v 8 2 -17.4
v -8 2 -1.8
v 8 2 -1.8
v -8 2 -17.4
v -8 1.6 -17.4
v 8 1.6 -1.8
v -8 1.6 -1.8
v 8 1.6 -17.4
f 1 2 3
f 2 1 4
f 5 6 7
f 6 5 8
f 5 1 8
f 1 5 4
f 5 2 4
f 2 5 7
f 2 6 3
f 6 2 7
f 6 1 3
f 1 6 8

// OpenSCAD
// file: ../p/box.scad
use <../lib.scad>
function ldraw_lib__box() = [
// 0 Box 6 (six faces)
// 0 Name: box.dat
// 0 Author: James Jessiman
// 0 !LDRAW_ORG Primitive UPDATE 2002-05
// 0 !LICENSE Licensed under CC BY 4.0 : see CAreadme.txt
// 
// 0 BFC CERTIFY CCW
  [0,"BFC","CERTIFY"],
  [0,"BFC","CCW"],
// 
// 0 !HISTORY 2002-08-22 [sbliss] Applied BFC
// 0 !HISTORY 2002-11-30 [PTadmin] Official Update 2002-05
// 0 !HISTORY 2007-06-24 [PTadmin] Header formatted for Contributor Agreement
// 0 !HISTORY 2008-07-01 [PTadmin] Official Update 2008-01
// 
// 
// 2 24 1 1 1 -1 1 1
  [2,24,1,1,1,-1,1,1],
// 2 24 -1 1 1 -1 1 -1
  [2,24,-1,1,1,-1,1,-1],
// 2 24 -1 1 -1 1 1 -1
  [2,24,-1,1,-1,1,1,-1],
// 2 24 1 1 -1 1 1 1
  [2,24,1,1,-1,1,1,1],
// 2 24 1 -1 1 -1 -1 1
  [2,24,1,-1,1,-1,-1,1],
// 2 24 -1 -1 1 -1 -1 -1
  [2,24,-1,-1,1,-1,-1,-1],
// 2 24 -1 -1 -1 1 -1 -1
  [2,24,-1,-1,-1,1,-1,-1],
// 2 24 1 -1 -1 1 -1 1
  [2,24,1,-1,-1,1,-1,1],
// 2 24 1 -1 1 1 1 1
  [2,24,1,-1,1,1,1,1],
// 2 24 -1 -1 1 -1 1 1
  [2,24,-1,-1,1,-1,1,1],
// 2 24 1 -1 -1 1 1 -1
  [2,24,1,-1,-1,1,1,-1],
// 2 24 -1 -1 -1 -1 1 -1
  [2,24,-1,-1,-1,-1,1,-1],
// 4 16 1 1 1 1 1 -1 -1 1 -1 -1 1 1
  [4,16,1,1,1,1,1,-1,-1,1,-1,-1,1,1],
// 4 16 -1 -1 -1 1 -1 -1 1 -1 1 -1 -1 1
  [4,16,-1,-1,-1,1,-1,-1,1,-1,1,-1,-1,1],
// 4 16 -1 -1 1 1 -1 1 1 1 1 -1 1 1
  [4,16,-1,-1,1,1,-1,1,1,1,1,-1,1,1],
// 4 16 -1 -1 -1 -1 -1 1 -1 1 1 -1 1 -1
  [4,16,-1,-1,-1,-1,-1,1,-1,1,1,-1,1,-1],
// 4 16 1 -1 -1 -1 -1 -1 -1 1 -1 1 1 -1
  [4,16,1,-1,-1,-1,-1,-1,-1,1,-1,1,1,-1],
// 4 16 1 -1 1 1 -1 -1 1 1 -1 1 1 1
  [4,16,1,-1,1,1,-1,-1,1,1,-1,1,1,1],
// 0
];
module ldraw_lib__box(step=0, col=false, unit=2/5, alt=false, line=0.2, solid=!$preview)
    makepoly(ldraw_lib__box(), step=step, col=col, unit=unit, alt=alt, line=line, solid=solid);
ldraw_lib__box(line=0.2);
// main file
use <../lib.scad>
use <../p/box.scad>
function ldraw_lib__u8032() = [
// 0 ~Mursten Glass for Window Pane  1 x  2 x  2
// 0 Name: u8032.dat
// 0 Author: J.C. Tchang [tchang]
// 0 !LDRAW_ORG Part UPDATE 2025-09
// 0 !LICENSE Licensed under CC BY 4.0 : see CAreadme.txt
// 
// 0 BFC CERTIFY CCW
  [0,"BFC","CERTIFY"],
  [0,"BFC","CCW"],
// 
// 0 !CATEGORY Window
// 0 !KEYWORDS Automatic Binding Brick
// 
// 0 !CMDLINE -c47
// 
// 0 !HISTORY 2019-09-09 [PTadmin] Official Update 2019-02
// 0 !HISTORY 2025-09-27 [OrionP] Changed winding to CCW
// 0 !HISTORY 2025-09-29 [OrionP] Official Update 2025-09
// 
// 1 16 0 24 4.5 20 0 0 0 0 19.5 0 0.5 0 box.dat
  [1,16,0,24,4.5,20,0,0,0,0,19.5,0,0.5,0, ldraw_lib__box()],
];
module ldraw_lib__u8032(step=0, col=false, unit=2/5, alt=false, line=0.2, solid=!$preview)
    makepoly(ldraw_lib__u8032(), step=step, col=col, unit=unit, alt=alt, line=line, solid=solid);
ldraw_lib__u8032(line=0.2);
